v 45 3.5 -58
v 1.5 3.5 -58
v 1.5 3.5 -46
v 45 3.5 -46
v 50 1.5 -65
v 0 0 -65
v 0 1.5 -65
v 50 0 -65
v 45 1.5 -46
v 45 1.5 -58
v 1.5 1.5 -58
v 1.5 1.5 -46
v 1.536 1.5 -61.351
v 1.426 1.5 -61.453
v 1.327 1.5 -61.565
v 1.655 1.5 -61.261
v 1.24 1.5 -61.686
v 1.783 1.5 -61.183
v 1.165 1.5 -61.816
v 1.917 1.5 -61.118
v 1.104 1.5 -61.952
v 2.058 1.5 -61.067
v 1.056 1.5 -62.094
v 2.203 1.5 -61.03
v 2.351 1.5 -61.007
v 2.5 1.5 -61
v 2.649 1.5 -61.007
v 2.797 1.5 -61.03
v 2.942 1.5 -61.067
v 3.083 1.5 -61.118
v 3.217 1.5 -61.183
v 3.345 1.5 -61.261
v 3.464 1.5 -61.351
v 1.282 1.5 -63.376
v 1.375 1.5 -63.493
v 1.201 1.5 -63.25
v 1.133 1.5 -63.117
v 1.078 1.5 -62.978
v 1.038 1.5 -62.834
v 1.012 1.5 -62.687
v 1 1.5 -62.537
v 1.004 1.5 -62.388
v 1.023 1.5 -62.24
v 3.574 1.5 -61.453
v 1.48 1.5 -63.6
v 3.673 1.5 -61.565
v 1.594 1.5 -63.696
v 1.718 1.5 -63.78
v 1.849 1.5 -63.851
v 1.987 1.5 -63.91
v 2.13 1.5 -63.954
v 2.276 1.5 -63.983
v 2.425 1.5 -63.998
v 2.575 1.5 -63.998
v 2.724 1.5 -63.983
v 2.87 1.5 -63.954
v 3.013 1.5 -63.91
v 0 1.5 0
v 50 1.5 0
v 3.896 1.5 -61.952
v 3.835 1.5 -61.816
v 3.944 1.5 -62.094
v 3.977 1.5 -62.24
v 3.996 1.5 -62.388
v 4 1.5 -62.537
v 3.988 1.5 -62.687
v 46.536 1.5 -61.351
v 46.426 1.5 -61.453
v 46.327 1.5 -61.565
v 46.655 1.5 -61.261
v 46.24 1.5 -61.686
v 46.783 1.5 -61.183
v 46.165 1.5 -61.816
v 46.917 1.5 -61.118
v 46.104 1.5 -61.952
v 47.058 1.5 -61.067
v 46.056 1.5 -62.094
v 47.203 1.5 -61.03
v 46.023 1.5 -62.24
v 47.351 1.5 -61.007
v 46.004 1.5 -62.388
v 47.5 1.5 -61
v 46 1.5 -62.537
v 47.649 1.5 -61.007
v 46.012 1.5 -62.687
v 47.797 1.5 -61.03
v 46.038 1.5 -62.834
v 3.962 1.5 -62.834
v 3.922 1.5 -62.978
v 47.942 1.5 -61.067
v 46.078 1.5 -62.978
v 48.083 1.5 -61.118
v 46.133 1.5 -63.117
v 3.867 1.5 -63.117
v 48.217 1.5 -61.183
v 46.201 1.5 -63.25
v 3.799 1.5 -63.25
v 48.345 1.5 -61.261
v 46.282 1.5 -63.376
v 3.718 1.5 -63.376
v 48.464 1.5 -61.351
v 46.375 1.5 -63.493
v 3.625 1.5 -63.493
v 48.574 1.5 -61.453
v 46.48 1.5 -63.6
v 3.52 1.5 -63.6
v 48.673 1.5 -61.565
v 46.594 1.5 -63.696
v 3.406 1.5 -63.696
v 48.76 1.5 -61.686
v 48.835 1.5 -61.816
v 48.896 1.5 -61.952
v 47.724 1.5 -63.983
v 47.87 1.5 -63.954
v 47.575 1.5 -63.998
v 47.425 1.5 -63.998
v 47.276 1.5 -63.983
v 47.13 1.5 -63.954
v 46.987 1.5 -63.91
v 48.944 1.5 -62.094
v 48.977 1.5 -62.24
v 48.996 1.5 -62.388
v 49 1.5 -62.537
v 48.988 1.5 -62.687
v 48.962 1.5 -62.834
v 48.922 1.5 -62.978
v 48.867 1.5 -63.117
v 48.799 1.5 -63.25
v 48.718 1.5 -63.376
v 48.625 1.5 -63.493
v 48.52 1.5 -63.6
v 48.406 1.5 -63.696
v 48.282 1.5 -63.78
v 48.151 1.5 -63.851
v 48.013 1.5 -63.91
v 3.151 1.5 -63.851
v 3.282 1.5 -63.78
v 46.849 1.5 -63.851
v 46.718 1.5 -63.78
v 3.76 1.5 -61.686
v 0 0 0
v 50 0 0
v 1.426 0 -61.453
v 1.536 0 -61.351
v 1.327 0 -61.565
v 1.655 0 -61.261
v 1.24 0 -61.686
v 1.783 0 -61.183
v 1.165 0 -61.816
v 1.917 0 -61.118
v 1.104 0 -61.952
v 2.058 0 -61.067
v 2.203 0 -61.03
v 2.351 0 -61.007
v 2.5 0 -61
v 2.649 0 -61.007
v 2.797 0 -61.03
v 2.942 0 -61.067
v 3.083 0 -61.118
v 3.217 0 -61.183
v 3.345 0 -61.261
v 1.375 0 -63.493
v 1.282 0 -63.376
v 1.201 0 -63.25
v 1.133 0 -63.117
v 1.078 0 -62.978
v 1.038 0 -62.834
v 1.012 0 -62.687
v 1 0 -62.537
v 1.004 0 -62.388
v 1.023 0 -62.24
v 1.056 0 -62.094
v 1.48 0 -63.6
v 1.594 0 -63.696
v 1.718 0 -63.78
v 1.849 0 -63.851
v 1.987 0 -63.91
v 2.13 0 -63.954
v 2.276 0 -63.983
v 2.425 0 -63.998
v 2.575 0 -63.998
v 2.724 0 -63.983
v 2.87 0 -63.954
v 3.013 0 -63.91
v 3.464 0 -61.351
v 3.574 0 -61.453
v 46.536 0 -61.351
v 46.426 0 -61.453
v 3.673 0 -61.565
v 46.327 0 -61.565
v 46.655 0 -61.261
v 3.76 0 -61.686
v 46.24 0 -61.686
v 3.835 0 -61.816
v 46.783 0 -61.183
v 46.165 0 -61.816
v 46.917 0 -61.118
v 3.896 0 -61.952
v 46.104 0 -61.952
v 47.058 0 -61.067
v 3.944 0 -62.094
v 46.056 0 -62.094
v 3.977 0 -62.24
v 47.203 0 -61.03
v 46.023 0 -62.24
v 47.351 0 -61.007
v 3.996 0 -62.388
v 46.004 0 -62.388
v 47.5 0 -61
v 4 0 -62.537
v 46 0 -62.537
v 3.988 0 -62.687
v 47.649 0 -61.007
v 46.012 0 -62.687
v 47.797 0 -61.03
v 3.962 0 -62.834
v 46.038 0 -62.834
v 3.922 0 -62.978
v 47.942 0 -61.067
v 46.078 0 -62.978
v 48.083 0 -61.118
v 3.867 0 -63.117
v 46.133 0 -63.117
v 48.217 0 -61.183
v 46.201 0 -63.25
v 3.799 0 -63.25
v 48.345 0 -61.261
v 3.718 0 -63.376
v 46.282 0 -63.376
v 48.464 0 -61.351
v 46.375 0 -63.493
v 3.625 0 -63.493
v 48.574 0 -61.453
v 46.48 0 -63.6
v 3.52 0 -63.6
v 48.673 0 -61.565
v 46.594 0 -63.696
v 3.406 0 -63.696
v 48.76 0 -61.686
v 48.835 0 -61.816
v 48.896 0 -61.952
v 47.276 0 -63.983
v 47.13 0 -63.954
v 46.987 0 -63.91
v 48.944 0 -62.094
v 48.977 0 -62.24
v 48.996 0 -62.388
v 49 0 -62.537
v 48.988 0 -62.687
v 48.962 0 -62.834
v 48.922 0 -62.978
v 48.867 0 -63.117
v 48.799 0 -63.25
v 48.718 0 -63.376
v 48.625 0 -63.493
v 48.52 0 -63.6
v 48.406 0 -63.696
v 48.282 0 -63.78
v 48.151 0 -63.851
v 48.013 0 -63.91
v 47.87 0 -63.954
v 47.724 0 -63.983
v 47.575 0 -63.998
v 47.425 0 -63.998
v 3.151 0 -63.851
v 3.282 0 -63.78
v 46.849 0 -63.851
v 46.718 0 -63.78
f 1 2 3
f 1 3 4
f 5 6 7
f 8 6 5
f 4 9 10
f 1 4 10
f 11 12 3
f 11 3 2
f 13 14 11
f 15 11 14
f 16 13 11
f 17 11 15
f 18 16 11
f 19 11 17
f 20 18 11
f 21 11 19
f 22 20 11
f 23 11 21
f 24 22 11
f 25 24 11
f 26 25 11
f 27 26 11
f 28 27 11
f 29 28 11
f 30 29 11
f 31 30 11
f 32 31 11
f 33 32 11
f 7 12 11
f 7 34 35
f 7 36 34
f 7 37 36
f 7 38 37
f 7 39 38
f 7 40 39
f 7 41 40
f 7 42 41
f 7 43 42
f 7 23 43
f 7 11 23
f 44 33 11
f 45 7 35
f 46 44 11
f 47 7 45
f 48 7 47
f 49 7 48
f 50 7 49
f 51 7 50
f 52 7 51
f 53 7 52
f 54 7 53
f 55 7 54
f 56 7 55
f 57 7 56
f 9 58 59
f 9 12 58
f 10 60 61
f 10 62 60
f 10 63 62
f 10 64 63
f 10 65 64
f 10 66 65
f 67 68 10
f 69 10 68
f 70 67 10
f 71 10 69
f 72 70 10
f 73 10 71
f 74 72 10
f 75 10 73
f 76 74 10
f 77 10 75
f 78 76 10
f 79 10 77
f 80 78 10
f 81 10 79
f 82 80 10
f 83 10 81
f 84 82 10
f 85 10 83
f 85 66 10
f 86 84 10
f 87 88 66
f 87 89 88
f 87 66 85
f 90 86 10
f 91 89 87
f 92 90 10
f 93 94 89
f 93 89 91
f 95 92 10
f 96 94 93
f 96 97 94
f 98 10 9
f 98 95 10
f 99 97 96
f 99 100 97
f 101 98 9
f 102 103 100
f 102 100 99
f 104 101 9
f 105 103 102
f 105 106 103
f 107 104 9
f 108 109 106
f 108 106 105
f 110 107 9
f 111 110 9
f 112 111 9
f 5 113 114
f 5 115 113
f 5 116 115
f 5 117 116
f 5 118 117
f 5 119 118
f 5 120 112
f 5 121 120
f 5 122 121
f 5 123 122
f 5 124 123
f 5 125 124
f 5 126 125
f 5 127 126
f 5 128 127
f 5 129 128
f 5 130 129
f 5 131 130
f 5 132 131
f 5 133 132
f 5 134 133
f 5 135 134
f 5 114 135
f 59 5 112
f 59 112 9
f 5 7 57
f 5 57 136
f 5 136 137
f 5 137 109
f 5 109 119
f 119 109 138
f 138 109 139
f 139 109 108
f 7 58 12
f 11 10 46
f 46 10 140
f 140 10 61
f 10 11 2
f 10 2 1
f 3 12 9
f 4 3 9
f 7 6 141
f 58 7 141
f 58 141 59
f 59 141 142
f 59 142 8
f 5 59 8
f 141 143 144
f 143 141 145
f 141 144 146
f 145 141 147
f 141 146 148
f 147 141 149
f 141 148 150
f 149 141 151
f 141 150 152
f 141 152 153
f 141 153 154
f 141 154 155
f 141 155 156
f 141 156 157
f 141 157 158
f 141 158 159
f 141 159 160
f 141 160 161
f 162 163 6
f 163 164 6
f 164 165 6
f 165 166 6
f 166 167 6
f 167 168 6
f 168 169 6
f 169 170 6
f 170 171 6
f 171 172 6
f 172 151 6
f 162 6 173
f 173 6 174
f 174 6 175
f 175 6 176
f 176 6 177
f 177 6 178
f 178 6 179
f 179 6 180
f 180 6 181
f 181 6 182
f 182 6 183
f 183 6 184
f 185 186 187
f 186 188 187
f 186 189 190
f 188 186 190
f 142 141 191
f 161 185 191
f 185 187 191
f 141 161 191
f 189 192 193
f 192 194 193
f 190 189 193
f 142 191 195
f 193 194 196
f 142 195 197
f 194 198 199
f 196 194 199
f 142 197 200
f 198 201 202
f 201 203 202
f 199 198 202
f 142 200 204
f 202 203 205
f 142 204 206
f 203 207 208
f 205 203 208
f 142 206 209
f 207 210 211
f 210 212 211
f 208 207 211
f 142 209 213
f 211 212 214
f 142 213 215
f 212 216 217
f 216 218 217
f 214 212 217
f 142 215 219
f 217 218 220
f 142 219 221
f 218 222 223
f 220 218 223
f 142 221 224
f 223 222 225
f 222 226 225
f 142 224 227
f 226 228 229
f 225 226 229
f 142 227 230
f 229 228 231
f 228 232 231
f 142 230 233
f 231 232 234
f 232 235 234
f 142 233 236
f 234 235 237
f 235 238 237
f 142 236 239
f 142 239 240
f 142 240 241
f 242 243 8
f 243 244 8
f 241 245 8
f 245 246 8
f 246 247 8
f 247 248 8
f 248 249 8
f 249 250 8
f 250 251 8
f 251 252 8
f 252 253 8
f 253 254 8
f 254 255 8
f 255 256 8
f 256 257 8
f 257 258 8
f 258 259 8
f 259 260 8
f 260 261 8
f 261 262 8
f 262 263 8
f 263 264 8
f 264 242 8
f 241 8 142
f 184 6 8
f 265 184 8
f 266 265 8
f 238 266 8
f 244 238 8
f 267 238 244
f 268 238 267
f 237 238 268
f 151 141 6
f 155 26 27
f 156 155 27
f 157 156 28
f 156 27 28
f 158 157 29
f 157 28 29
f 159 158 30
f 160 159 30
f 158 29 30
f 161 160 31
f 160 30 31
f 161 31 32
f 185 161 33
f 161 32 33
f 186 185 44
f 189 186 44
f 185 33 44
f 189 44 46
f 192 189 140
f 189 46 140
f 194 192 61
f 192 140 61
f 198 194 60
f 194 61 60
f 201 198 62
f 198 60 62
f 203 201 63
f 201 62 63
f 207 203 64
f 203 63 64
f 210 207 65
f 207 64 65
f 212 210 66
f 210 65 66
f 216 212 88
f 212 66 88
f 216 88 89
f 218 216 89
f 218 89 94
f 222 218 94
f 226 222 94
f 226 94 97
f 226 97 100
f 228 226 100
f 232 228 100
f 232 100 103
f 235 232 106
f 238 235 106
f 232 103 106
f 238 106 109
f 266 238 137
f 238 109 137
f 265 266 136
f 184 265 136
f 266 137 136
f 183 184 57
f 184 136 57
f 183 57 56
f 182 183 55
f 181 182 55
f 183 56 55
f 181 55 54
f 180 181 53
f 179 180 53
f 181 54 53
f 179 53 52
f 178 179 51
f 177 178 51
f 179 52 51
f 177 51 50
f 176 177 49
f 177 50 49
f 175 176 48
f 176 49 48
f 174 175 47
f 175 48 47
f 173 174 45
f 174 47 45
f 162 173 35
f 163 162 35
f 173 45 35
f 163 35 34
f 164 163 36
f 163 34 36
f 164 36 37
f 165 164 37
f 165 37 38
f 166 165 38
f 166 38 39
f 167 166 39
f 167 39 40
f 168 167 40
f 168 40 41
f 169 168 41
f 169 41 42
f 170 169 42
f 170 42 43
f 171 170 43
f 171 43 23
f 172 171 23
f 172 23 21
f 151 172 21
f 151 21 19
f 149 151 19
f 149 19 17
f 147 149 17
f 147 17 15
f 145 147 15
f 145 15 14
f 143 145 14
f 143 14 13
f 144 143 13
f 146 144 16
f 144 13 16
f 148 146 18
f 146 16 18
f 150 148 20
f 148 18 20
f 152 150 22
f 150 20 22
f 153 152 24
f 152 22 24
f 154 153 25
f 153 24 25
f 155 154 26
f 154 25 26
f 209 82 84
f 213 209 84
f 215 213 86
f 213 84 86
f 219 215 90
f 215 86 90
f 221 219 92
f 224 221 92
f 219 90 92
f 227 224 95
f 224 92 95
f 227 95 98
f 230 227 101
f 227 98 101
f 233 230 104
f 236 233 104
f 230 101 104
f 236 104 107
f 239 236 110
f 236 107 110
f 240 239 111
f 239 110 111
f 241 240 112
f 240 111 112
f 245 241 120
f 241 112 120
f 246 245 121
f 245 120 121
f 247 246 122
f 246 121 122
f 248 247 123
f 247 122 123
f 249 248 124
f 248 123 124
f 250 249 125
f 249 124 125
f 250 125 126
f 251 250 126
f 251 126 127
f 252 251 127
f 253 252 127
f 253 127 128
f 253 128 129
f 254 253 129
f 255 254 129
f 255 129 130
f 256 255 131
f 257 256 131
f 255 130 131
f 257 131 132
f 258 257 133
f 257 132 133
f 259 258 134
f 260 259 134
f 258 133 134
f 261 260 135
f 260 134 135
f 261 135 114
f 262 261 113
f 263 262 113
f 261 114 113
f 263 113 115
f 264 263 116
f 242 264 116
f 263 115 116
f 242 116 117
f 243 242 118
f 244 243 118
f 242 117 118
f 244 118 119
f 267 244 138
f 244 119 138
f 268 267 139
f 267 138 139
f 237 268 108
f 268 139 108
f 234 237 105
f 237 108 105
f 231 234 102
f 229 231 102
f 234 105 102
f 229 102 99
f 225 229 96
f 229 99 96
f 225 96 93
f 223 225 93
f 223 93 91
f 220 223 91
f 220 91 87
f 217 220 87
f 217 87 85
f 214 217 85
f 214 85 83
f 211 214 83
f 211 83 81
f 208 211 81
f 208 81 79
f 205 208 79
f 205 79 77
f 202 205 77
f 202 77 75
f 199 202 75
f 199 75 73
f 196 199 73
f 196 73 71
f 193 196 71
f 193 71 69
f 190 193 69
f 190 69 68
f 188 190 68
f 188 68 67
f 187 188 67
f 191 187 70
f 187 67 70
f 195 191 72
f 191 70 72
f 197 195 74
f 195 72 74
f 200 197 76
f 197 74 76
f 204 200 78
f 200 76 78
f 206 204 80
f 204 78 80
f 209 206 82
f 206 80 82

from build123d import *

# Parameters (mm, degrees)
SKETCH1_W           = 50
SKETCH1_H           = 44
SKETCH1_H_2         = 21
BOSS_EXTRUDE1_DEPTH = 1.5
SKETCH2_W           = 43.5
SKETCH2_H           = 12
BOSS_EXTRUDE3_DEPTH = 2
SKETCH4_R           = 1.5
CUT_EXTRUDE1_DEPTH  = 1.5


with BuildPart() as part:
    # Sketch1 → Boss-Extrude1 (new body)
    with BuildSketch(Plane(origin=(0, 0, 0), x_dir=(1, 0, 0), z_dir=(0, 1, 0))):
        with Locations((25, 22)):
            Rectangle(SKETCH1_W, SKETCH1_H)
        with Locations((25, 54.5)):
            Rectangle(SKETCH1_W, SKETCH1_H_2)
    extrude(amount=BOSS_EXTRUDE1_DEPTH)

    # Sketch2 → Boss-Extrude3 (add)
    with BuildSketch(Plane(origin=(0, 1.5, 0), x_dir=(1, 0, 0), z_dir=(0, 1, 0))):
        with Locations((23.25, 52)):
            Rectangle(SKETCH2_W, SKETCH2_H)
    extrude(amount=BOSS_EXTRUDE3_DEPTH)

    # Sketch4 → Cut-Extrude1 (cut)
    with BuildSketch(Plane(origin=(0, 1.5, 0), x_dir=(1, 0, 0), z_dir=(0, 1, 0))):
        with Locations(Location((2.5, 62.5, 0), (0, 0, 270))):
            Circle(SKETCH4_R)
        with Locations(Location((47.5, 62.5, 0), (0, 0, 270))):
            Circle(SKETCH4_R)
    extrude(amount=-CUT_EXTRUDE1_DEPTH, mode=Mode.SUBTRACT)


solid = part.part
